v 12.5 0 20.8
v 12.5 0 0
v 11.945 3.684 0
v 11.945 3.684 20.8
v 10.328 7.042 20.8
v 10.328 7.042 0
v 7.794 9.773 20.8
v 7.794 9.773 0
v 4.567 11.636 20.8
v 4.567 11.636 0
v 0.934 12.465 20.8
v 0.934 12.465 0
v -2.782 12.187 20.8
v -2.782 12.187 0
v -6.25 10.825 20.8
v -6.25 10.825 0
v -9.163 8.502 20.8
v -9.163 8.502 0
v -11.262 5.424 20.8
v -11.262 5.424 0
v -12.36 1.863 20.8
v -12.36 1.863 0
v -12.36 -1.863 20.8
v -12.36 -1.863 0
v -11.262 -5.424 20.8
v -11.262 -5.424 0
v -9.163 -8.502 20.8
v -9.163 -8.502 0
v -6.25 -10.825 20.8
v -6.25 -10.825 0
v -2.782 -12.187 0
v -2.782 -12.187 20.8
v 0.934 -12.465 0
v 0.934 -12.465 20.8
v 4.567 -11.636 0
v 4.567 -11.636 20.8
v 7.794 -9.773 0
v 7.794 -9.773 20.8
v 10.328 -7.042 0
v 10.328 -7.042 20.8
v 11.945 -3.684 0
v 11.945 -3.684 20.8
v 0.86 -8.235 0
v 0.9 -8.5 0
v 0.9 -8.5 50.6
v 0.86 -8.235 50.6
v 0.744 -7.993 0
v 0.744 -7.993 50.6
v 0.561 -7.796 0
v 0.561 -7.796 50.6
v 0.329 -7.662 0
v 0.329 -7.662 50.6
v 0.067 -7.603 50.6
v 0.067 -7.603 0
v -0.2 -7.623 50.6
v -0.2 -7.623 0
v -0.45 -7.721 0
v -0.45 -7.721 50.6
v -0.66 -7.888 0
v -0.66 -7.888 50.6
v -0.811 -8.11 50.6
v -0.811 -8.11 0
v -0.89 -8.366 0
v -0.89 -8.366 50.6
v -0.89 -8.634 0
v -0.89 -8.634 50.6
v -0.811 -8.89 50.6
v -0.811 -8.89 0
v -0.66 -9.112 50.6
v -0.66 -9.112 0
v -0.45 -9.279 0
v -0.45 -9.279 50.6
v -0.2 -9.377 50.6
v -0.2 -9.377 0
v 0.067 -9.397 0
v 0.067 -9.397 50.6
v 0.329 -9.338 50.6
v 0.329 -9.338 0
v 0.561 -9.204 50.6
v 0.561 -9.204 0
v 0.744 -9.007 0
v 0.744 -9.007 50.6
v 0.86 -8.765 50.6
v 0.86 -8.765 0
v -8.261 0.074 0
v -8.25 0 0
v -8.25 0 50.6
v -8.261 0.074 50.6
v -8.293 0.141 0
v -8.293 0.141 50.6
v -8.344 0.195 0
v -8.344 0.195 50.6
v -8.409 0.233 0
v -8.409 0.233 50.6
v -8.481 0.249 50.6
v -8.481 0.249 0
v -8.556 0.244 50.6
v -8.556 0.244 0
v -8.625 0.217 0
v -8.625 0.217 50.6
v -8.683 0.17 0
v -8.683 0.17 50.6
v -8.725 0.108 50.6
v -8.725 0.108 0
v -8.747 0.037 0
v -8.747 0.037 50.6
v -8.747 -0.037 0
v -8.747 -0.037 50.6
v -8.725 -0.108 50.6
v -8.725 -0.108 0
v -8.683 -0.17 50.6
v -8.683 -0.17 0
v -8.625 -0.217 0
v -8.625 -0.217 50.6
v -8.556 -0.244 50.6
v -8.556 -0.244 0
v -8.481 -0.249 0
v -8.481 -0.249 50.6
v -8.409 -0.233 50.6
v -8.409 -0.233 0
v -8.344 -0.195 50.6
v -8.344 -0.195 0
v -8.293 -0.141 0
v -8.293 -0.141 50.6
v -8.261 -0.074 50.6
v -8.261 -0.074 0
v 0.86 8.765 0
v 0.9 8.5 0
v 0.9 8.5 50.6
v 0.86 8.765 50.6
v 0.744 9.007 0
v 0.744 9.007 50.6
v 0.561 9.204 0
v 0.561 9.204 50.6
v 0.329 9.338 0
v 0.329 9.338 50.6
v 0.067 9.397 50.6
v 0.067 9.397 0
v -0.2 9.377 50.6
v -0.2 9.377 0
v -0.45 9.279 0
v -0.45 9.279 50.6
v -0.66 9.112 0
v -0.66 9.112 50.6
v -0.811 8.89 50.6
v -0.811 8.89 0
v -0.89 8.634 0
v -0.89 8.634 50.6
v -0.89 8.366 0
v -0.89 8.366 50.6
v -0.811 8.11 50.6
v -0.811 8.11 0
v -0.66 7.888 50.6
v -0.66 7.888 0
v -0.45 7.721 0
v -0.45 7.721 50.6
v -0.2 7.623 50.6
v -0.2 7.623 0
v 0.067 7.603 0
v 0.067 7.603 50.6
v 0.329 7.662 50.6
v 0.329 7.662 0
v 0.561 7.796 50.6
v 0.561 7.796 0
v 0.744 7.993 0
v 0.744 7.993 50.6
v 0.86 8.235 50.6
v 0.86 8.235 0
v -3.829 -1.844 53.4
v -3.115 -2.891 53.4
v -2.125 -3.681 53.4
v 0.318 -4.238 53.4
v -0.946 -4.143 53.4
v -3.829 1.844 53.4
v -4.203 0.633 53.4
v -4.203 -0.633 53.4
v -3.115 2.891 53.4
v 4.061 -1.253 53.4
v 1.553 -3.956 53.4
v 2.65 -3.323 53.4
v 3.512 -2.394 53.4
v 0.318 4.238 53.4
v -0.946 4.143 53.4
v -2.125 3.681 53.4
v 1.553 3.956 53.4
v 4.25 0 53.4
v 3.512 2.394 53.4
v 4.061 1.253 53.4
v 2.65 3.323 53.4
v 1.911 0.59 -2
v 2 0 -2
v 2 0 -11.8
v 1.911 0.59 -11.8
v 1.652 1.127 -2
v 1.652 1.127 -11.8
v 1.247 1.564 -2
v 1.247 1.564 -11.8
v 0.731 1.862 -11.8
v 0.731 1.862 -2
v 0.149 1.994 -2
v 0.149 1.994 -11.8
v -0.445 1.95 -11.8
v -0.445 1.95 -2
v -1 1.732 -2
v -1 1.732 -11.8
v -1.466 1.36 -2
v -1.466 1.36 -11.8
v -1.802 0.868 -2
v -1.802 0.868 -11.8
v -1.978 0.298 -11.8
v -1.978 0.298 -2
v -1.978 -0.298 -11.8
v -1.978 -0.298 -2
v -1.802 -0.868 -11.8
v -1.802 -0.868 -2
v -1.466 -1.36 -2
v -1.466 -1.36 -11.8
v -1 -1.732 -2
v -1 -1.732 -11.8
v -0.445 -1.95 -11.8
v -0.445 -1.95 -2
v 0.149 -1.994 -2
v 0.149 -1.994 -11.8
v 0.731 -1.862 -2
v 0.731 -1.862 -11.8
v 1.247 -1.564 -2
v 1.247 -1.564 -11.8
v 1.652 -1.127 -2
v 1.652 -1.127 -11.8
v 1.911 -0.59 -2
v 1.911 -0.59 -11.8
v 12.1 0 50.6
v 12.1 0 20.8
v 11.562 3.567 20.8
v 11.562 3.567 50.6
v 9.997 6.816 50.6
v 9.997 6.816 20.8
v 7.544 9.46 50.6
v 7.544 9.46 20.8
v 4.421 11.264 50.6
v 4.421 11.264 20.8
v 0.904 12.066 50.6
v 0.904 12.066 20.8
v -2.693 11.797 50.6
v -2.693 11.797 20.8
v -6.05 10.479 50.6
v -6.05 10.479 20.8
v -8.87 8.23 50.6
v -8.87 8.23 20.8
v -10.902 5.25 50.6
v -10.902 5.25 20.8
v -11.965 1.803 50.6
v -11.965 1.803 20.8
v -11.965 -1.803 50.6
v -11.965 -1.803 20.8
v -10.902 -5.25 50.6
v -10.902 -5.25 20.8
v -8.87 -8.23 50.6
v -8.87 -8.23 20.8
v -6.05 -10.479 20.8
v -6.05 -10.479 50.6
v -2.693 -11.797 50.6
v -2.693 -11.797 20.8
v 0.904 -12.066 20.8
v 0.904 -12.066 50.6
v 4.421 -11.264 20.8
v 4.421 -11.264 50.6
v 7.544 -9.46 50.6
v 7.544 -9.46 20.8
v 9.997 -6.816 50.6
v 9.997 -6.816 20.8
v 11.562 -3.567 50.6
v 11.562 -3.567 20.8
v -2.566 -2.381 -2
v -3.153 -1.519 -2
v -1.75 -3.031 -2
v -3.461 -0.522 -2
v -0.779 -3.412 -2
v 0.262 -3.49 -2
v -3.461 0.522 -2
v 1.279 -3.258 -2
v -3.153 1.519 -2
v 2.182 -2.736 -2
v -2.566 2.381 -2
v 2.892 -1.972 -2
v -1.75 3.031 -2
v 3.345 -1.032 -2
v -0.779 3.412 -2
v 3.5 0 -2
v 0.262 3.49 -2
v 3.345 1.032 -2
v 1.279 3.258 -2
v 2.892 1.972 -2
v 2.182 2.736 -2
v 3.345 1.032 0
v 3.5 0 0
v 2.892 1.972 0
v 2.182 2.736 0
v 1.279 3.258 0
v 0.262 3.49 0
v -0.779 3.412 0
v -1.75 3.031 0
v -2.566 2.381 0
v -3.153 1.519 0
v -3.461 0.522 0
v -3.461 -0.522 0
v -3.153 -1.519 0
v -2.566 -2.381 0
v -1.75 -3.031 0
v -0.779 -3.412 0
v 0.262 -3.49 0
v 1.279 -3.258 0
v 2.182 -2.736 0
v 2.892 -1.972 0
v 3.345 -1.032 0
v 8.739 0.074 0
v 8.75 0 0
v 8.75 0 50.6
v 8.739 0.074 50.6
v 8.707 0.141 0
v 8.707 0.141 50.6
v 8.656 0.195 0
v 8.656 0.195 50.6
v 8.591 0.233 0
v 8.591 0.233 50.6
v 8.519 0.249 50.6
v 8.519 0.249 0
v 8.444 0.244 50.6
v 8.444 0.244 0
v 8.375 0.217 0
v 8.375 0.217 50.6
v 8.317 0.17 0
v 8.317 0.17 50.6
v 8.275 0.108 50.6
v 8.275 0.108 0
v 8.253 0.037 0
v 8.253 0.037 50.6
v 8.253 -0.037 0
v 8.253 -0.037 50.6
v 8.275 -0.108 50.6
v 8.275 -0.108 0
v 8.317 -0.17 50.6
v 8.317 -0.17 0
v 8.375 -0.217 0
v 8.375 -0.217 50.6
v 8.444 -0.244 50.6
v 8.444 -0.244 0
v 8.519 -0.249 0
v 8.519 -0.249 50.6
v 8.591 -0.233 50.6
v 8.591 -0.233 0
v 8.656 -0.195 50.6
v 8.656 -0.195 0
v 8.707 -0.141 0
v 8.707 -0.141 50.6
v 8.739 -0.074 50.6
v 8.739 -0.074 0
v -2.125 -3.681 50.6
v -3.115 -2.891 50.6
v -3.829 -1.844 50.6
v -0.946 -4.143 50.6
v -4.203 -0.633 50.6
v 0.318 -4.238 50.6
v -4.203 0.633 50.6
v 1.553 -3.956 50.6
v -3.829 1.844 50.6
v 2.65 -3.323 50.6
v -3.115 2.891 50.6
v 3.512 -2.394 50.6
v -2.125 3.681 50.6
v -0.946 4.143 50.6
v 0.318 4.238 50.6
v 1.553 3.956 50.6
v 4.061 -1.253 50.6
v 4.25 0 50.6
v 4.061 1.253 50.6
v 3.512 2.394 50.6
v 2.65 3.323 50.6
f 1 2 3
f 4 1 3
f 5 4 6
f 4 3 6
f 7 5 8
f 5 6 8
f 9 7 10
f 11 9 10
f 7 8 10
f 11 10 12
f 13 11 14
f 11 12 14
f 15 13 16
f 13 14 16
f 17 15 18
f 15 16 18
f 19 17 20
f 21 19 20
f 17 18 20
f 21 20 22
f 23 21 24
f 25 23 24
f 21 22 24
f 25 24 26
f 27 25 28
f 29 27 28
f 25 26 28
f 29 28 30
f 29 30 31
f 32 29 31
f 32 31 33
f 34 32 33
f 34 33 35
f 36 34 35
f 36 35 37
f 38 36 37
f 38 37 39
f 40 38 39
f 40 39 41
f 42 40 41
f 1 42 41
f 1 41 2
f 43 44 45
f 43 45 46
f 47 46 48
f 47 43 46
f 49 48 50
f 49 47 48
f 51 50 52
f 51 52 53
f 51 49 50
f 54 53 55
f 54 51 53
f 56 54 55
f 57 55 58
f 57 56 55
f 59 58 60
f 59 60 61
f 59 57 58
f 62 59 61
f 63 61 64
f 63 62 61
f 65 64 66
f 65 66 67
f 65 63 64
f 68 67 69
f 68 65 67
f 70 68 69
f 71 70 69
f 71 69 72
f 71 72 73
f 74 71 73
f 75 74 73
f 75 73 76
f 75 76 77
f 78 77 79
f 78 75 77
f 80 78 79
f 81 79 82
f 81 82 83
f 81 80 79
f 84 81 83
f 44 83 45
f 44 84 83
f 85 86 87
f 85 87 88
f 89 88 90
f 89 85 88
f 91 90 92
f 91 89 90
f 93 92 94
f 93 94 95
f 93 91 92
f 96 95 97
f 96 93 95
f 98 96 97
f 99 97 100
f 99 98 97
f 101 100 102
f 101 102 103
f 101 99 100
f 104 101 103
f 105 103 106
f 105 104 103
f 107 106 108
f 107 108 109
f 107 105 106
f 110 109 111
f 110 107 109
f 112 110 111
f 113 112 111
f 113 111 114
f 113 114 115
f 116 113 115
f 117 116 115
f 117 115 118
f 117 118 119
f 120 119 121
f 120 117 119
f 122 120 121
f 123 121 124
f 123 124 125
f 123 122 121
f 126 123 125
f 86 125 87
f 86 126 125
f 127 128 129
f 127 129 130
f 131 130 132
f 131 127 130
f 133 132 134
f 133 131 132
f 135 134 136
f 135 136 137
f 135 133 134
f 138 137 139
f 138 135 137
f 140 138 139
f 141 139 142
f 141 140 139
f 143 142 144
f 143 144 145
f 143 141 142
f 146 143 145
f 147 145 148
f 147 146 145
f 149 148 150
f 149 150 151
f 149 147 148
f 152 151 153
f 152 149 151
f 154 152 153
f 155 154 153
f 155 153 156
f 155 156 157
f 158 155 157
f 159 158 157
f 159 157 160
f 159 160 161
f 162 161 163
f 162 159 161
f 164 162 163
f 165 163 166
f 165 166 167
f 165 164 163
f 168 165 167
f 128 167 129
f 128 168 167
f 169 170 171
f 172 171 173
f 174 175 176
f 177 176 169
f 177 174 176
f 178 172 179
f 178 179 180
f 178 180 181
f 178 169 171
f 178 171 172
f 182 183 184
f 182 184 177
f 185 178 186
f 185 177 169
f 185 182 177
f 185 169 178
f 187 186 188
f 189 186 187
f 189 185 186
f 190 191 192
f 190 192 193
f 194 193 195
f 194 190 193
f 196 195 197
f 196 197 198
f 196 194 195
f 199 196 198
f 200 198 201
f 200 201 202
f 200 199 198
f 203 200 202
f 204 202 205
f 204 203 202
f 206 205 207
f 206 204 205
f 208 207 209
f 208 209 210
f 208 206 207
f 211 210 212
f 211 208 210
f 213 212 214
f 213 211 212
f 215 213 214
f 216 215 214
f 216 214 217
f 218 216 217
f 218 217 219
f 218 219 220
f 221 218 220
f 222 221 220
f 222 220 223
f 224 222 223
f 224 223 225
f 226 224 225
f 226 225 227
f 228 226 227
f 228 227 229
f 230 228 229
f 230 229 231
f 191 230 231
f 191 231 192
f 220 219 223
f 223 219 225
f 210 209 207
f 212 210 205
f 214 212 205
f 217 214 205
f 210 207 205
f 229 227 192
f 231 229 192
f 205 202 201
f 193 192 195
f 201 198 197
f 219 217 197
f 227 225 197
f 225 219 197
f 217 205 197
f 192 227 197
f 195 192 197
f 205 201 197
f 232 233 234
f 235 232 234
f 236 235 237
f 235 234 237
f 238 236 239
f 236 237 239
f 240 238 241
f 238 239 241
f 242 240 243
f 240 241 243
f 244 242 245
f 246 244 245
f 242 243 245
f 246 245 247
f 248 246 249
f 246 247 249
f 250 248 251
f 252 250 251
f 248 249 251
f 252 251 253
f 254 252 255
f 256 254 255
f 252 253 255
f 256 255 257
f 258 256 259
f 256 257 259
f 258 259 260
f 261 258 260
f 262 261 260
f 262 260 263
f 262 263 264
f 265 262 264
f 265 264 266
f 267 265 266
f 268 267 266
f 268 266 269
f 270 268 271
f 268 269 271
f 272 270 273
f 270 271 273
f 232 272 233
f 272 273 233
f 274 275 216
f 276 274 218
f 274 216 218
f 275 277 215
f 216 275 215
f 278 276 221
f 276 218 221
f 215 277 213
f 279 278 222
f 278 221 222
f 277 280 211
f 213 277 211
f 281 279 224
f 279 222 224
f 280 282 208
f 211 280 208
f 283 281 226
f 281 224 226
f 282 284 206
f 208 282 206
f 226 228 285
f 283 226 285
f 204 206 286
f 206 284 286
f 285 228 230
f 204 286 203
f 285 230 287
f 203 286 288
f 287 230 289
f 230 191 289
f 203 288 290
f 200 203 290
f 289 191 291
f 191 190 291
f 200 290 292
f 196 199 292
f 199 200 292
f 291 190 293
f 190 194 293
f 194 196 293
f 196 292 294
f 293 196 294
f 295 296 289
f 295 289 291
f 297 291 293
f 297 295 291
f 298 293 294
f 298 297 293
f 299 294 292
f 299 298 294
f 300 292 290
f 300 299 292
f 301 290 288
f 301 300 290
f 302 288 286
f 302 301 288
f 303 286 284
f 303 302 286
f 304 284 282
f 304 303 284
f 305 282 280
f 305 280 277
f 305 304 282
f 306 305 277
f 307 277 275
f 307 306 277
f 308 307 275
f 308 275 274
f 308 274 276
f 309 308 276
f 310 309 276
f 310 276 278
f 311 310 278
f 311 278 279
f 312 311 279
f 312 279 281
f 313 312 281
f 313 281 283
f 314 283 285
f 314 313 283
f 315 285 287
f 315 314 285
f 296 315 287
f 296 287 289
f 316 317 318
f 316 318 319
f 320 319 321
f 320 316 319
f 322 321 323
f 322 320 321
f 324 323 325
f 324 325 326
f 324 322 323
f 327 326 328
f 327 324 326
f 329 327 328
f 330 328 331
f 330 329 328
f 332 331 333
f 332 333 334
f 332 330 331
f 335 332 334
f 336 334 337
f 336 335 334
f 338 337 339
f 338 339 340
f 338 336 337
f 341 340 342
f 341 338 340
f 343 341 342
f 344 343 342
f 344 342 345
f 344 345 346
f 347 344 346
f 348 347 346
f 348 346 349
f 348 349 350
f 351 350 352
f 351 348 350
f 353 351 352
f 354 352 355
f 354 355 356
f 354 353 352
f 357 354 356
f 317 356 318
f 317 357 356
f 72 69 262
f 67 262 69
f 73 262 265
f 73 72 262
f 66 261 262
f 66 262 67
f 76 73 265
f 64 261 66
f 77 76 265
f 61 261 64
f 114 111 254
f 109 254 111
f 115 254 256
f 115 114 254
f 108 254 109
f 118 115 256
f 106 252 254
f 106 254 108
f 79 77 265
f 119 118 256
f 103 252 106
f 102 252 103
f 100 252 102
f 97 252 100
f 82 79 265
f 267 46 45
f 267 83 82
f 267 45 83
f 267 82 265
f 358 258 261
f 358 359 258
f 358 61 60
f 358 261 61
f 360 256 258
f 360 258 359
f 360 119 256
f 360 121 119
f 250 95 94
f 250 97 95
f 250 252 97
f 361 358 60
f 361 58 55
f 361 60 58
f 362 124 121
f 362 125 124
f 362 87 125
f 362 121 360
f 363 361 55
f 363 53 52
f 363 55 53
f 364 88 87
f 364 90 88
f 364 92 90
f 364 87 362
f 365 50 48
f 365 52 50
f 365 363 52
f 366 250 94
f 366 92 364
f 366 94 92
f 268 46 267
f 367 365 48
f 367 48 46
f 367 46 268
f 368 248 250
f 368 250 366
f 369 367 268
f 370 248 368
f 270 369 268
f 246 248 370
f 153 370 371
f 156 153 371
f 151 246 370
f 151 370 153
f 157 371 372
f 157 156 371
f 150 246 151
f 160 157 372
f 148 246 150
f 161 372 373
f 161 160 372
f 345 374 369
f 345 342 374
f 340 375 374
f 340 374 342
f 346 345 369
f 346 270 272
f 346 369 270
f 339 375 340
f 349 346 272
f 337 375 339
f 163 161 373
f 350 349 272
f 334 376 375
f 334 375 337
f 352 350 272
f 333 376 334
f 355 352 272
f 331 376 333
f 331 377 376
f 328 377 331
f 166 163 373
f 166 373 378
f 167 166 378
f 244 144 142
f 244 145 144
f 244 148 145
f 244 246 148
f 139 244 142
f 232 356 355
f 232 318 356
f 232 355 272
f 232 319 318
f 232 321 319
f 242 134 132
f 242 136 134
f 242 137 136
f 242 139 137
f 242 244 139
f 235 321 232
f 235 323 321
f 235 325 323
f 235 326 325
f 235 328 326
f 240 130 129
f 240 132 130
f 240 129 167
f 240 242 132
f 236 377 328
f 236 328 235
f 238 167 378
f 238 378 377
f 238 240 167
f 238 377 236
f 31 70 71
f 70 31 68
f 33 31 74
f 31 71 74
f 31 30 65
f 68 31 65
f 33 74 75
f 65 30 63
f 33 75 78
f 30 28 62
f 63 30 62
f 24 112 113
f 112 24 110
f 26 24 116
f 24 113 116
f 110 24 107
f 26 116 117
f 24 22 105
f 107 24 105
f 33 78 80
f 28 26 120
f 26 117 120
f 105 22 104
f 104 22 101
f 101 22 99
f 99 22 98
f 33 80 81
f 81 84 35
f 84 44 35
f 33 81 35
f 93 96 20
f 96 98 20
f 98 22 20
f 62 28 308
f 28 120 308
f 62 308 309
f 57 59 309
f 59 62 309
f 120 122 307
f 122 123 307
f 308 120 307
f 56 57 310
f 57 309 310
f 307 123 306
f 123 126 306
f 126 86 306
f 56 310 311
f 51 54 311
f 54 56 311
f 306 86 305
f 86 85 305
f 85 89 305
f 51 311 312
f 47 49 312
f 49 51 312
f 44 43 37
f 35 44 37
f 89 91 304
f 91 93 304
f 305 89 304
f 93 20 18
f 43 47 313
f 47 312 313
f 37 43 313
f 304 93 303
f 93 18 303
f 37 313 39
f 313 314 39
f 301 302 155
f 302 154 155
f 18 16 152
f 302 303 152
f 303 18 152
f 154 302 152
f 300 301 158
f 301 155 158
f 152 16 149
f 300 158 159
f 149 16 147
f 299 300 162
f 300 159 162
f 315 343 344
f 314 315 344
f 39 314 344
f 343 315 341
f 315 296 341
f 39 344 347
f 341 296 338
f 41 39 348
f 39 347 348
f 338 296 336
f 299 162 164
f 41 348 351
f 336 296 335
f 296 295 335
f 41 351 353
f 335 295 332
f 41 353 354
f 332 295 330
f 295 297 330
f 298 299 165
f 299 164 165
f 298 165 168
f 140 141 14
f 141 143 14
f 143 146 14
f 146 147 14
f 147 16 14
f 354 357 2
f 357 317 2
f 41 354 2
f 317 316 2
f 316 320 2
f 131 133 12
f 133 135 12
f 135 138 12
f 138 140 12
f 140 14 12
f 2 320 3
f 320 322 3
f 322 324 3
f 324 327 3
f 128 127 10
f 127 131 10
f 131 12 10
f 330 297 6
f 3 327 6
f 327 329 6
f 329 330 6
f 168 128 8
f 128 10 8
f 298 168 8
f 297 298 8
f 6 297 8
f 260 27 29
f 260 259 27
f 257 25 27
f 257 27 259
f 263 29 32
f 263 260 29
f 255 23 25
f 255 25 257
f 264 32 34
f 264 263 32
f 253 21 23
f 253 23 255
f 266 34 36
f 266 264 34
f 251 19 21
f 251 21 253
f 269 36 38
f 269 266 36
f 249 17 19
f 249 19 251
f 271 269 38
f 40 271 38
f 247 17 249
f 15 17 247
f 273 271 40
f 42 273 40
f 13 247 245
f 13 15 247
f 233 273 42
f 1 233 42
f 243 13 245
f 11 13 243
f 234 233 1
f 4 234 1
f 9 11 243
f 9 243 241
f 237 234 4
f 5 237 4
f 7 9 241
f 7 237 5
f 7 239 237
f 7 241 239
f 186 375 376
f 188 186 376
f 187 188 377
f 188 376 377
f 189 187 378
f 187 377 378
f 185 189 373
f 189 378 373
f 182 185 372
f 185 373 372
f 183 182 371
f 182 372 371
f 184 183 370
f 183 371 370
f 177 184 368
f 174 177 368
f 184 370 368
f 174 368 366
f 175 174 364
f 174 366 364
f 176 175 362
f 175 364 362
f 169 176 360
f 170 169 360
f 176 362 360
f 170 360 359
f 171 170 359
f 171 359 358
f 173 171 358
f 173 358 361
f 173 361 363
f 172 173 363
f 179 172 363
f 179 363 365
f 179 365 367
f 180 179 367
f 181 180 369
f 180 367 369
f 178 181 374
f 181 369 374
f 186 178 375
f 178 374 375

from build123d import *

# Parameters (mm, degrees)
ESBO_O1_R                = 12.5
ESBO_O1_R_2              = 0.9
ESBO_O1_R_3              = 0.25
RESSALTO_EXTRUS_O1_DEPTH = 50.6
ESBO_O2_R                = 3.5
RESSALTO_EXTRUS_O2_DEPTH = 2
ESBO_O3_R                = 2
RESSALTO_EXTRUS_O3_DEPTH = 11.8
ESBO_O4_R                = 4.25
RESSALTO_EXTRUS_O4_DEPTH = 2.8
CORTE_EXTRUS_O1_START    = -29.8
ESBO_O6_R                = 12.5
ESBO_O6_R_2              = 12.1
CORTE_EXTRUS_O1_DEPTH    = 29.8


with BuildPart() as part:
    # Esboço1 → Ressalto-extrusão1 (new body)
    with BuildSketch(Plane.XY):
        Circle(ESBO_O1_R)
        with Locations((0, 8.5)):
            Circle(ESBO_O1_R_2, mode=Mode.SUBTRACT)
        with Locations((0, -8.5)):
            Circle(ESBO_O1_R_2, mode=Mode.SUBTRACT)
        with Locations((8.5, 0)):
            Circle(ESBO_O1_R_3, mode=Mode.SUBTRACT)
        with Locations((-8.5, 0)):
            Circle(ESBO_O1_R_3, mode=Mode.SUBTRACT)
    extrude(amount=RESSALTO_EXTRUS_O1_DEPTH)

    # Esboço2 → Ressalto-extrusão2 (add)
    with BuildSketch(Plane.XY):
        Circle(ESBO_O2_R)
    extrude(amount=-RESSALTO_EXTRUS_O2_DEPTH)

    # Esboço3 → Ressalto-extrusão3 (add)
    with BuildSketch(Plane.XY):
        Circle(ESBO_O3_R)
    extrude(amount=-RESSALTO_EXTRUS_O3_DEPTH)

    # Esboço4 → Ressalto-extrusão4 (add)
    with BuildSketch(Plane.XY.offset(50.6)):
        Circle(ESBO_O4_R)
    extrude(amount=RESSALTO_EXTRUS_O4_DEPTH)

    # Esboço6 → Corte-extrusão1 (cut)
    with BuildSketch(Plane.XY.offset(50.6).offset(CORTE_EXTRUS_O1_START)):
        Circle(ESBO_O6_R)
        Circle(ESBO_O6_R_2, mode=Mode.SUBTRACT)
    extrude(amount=CORTE_EXTRUS_O1_DEPTH, mode=Mode.SUBTRACT)


solid = part.part
